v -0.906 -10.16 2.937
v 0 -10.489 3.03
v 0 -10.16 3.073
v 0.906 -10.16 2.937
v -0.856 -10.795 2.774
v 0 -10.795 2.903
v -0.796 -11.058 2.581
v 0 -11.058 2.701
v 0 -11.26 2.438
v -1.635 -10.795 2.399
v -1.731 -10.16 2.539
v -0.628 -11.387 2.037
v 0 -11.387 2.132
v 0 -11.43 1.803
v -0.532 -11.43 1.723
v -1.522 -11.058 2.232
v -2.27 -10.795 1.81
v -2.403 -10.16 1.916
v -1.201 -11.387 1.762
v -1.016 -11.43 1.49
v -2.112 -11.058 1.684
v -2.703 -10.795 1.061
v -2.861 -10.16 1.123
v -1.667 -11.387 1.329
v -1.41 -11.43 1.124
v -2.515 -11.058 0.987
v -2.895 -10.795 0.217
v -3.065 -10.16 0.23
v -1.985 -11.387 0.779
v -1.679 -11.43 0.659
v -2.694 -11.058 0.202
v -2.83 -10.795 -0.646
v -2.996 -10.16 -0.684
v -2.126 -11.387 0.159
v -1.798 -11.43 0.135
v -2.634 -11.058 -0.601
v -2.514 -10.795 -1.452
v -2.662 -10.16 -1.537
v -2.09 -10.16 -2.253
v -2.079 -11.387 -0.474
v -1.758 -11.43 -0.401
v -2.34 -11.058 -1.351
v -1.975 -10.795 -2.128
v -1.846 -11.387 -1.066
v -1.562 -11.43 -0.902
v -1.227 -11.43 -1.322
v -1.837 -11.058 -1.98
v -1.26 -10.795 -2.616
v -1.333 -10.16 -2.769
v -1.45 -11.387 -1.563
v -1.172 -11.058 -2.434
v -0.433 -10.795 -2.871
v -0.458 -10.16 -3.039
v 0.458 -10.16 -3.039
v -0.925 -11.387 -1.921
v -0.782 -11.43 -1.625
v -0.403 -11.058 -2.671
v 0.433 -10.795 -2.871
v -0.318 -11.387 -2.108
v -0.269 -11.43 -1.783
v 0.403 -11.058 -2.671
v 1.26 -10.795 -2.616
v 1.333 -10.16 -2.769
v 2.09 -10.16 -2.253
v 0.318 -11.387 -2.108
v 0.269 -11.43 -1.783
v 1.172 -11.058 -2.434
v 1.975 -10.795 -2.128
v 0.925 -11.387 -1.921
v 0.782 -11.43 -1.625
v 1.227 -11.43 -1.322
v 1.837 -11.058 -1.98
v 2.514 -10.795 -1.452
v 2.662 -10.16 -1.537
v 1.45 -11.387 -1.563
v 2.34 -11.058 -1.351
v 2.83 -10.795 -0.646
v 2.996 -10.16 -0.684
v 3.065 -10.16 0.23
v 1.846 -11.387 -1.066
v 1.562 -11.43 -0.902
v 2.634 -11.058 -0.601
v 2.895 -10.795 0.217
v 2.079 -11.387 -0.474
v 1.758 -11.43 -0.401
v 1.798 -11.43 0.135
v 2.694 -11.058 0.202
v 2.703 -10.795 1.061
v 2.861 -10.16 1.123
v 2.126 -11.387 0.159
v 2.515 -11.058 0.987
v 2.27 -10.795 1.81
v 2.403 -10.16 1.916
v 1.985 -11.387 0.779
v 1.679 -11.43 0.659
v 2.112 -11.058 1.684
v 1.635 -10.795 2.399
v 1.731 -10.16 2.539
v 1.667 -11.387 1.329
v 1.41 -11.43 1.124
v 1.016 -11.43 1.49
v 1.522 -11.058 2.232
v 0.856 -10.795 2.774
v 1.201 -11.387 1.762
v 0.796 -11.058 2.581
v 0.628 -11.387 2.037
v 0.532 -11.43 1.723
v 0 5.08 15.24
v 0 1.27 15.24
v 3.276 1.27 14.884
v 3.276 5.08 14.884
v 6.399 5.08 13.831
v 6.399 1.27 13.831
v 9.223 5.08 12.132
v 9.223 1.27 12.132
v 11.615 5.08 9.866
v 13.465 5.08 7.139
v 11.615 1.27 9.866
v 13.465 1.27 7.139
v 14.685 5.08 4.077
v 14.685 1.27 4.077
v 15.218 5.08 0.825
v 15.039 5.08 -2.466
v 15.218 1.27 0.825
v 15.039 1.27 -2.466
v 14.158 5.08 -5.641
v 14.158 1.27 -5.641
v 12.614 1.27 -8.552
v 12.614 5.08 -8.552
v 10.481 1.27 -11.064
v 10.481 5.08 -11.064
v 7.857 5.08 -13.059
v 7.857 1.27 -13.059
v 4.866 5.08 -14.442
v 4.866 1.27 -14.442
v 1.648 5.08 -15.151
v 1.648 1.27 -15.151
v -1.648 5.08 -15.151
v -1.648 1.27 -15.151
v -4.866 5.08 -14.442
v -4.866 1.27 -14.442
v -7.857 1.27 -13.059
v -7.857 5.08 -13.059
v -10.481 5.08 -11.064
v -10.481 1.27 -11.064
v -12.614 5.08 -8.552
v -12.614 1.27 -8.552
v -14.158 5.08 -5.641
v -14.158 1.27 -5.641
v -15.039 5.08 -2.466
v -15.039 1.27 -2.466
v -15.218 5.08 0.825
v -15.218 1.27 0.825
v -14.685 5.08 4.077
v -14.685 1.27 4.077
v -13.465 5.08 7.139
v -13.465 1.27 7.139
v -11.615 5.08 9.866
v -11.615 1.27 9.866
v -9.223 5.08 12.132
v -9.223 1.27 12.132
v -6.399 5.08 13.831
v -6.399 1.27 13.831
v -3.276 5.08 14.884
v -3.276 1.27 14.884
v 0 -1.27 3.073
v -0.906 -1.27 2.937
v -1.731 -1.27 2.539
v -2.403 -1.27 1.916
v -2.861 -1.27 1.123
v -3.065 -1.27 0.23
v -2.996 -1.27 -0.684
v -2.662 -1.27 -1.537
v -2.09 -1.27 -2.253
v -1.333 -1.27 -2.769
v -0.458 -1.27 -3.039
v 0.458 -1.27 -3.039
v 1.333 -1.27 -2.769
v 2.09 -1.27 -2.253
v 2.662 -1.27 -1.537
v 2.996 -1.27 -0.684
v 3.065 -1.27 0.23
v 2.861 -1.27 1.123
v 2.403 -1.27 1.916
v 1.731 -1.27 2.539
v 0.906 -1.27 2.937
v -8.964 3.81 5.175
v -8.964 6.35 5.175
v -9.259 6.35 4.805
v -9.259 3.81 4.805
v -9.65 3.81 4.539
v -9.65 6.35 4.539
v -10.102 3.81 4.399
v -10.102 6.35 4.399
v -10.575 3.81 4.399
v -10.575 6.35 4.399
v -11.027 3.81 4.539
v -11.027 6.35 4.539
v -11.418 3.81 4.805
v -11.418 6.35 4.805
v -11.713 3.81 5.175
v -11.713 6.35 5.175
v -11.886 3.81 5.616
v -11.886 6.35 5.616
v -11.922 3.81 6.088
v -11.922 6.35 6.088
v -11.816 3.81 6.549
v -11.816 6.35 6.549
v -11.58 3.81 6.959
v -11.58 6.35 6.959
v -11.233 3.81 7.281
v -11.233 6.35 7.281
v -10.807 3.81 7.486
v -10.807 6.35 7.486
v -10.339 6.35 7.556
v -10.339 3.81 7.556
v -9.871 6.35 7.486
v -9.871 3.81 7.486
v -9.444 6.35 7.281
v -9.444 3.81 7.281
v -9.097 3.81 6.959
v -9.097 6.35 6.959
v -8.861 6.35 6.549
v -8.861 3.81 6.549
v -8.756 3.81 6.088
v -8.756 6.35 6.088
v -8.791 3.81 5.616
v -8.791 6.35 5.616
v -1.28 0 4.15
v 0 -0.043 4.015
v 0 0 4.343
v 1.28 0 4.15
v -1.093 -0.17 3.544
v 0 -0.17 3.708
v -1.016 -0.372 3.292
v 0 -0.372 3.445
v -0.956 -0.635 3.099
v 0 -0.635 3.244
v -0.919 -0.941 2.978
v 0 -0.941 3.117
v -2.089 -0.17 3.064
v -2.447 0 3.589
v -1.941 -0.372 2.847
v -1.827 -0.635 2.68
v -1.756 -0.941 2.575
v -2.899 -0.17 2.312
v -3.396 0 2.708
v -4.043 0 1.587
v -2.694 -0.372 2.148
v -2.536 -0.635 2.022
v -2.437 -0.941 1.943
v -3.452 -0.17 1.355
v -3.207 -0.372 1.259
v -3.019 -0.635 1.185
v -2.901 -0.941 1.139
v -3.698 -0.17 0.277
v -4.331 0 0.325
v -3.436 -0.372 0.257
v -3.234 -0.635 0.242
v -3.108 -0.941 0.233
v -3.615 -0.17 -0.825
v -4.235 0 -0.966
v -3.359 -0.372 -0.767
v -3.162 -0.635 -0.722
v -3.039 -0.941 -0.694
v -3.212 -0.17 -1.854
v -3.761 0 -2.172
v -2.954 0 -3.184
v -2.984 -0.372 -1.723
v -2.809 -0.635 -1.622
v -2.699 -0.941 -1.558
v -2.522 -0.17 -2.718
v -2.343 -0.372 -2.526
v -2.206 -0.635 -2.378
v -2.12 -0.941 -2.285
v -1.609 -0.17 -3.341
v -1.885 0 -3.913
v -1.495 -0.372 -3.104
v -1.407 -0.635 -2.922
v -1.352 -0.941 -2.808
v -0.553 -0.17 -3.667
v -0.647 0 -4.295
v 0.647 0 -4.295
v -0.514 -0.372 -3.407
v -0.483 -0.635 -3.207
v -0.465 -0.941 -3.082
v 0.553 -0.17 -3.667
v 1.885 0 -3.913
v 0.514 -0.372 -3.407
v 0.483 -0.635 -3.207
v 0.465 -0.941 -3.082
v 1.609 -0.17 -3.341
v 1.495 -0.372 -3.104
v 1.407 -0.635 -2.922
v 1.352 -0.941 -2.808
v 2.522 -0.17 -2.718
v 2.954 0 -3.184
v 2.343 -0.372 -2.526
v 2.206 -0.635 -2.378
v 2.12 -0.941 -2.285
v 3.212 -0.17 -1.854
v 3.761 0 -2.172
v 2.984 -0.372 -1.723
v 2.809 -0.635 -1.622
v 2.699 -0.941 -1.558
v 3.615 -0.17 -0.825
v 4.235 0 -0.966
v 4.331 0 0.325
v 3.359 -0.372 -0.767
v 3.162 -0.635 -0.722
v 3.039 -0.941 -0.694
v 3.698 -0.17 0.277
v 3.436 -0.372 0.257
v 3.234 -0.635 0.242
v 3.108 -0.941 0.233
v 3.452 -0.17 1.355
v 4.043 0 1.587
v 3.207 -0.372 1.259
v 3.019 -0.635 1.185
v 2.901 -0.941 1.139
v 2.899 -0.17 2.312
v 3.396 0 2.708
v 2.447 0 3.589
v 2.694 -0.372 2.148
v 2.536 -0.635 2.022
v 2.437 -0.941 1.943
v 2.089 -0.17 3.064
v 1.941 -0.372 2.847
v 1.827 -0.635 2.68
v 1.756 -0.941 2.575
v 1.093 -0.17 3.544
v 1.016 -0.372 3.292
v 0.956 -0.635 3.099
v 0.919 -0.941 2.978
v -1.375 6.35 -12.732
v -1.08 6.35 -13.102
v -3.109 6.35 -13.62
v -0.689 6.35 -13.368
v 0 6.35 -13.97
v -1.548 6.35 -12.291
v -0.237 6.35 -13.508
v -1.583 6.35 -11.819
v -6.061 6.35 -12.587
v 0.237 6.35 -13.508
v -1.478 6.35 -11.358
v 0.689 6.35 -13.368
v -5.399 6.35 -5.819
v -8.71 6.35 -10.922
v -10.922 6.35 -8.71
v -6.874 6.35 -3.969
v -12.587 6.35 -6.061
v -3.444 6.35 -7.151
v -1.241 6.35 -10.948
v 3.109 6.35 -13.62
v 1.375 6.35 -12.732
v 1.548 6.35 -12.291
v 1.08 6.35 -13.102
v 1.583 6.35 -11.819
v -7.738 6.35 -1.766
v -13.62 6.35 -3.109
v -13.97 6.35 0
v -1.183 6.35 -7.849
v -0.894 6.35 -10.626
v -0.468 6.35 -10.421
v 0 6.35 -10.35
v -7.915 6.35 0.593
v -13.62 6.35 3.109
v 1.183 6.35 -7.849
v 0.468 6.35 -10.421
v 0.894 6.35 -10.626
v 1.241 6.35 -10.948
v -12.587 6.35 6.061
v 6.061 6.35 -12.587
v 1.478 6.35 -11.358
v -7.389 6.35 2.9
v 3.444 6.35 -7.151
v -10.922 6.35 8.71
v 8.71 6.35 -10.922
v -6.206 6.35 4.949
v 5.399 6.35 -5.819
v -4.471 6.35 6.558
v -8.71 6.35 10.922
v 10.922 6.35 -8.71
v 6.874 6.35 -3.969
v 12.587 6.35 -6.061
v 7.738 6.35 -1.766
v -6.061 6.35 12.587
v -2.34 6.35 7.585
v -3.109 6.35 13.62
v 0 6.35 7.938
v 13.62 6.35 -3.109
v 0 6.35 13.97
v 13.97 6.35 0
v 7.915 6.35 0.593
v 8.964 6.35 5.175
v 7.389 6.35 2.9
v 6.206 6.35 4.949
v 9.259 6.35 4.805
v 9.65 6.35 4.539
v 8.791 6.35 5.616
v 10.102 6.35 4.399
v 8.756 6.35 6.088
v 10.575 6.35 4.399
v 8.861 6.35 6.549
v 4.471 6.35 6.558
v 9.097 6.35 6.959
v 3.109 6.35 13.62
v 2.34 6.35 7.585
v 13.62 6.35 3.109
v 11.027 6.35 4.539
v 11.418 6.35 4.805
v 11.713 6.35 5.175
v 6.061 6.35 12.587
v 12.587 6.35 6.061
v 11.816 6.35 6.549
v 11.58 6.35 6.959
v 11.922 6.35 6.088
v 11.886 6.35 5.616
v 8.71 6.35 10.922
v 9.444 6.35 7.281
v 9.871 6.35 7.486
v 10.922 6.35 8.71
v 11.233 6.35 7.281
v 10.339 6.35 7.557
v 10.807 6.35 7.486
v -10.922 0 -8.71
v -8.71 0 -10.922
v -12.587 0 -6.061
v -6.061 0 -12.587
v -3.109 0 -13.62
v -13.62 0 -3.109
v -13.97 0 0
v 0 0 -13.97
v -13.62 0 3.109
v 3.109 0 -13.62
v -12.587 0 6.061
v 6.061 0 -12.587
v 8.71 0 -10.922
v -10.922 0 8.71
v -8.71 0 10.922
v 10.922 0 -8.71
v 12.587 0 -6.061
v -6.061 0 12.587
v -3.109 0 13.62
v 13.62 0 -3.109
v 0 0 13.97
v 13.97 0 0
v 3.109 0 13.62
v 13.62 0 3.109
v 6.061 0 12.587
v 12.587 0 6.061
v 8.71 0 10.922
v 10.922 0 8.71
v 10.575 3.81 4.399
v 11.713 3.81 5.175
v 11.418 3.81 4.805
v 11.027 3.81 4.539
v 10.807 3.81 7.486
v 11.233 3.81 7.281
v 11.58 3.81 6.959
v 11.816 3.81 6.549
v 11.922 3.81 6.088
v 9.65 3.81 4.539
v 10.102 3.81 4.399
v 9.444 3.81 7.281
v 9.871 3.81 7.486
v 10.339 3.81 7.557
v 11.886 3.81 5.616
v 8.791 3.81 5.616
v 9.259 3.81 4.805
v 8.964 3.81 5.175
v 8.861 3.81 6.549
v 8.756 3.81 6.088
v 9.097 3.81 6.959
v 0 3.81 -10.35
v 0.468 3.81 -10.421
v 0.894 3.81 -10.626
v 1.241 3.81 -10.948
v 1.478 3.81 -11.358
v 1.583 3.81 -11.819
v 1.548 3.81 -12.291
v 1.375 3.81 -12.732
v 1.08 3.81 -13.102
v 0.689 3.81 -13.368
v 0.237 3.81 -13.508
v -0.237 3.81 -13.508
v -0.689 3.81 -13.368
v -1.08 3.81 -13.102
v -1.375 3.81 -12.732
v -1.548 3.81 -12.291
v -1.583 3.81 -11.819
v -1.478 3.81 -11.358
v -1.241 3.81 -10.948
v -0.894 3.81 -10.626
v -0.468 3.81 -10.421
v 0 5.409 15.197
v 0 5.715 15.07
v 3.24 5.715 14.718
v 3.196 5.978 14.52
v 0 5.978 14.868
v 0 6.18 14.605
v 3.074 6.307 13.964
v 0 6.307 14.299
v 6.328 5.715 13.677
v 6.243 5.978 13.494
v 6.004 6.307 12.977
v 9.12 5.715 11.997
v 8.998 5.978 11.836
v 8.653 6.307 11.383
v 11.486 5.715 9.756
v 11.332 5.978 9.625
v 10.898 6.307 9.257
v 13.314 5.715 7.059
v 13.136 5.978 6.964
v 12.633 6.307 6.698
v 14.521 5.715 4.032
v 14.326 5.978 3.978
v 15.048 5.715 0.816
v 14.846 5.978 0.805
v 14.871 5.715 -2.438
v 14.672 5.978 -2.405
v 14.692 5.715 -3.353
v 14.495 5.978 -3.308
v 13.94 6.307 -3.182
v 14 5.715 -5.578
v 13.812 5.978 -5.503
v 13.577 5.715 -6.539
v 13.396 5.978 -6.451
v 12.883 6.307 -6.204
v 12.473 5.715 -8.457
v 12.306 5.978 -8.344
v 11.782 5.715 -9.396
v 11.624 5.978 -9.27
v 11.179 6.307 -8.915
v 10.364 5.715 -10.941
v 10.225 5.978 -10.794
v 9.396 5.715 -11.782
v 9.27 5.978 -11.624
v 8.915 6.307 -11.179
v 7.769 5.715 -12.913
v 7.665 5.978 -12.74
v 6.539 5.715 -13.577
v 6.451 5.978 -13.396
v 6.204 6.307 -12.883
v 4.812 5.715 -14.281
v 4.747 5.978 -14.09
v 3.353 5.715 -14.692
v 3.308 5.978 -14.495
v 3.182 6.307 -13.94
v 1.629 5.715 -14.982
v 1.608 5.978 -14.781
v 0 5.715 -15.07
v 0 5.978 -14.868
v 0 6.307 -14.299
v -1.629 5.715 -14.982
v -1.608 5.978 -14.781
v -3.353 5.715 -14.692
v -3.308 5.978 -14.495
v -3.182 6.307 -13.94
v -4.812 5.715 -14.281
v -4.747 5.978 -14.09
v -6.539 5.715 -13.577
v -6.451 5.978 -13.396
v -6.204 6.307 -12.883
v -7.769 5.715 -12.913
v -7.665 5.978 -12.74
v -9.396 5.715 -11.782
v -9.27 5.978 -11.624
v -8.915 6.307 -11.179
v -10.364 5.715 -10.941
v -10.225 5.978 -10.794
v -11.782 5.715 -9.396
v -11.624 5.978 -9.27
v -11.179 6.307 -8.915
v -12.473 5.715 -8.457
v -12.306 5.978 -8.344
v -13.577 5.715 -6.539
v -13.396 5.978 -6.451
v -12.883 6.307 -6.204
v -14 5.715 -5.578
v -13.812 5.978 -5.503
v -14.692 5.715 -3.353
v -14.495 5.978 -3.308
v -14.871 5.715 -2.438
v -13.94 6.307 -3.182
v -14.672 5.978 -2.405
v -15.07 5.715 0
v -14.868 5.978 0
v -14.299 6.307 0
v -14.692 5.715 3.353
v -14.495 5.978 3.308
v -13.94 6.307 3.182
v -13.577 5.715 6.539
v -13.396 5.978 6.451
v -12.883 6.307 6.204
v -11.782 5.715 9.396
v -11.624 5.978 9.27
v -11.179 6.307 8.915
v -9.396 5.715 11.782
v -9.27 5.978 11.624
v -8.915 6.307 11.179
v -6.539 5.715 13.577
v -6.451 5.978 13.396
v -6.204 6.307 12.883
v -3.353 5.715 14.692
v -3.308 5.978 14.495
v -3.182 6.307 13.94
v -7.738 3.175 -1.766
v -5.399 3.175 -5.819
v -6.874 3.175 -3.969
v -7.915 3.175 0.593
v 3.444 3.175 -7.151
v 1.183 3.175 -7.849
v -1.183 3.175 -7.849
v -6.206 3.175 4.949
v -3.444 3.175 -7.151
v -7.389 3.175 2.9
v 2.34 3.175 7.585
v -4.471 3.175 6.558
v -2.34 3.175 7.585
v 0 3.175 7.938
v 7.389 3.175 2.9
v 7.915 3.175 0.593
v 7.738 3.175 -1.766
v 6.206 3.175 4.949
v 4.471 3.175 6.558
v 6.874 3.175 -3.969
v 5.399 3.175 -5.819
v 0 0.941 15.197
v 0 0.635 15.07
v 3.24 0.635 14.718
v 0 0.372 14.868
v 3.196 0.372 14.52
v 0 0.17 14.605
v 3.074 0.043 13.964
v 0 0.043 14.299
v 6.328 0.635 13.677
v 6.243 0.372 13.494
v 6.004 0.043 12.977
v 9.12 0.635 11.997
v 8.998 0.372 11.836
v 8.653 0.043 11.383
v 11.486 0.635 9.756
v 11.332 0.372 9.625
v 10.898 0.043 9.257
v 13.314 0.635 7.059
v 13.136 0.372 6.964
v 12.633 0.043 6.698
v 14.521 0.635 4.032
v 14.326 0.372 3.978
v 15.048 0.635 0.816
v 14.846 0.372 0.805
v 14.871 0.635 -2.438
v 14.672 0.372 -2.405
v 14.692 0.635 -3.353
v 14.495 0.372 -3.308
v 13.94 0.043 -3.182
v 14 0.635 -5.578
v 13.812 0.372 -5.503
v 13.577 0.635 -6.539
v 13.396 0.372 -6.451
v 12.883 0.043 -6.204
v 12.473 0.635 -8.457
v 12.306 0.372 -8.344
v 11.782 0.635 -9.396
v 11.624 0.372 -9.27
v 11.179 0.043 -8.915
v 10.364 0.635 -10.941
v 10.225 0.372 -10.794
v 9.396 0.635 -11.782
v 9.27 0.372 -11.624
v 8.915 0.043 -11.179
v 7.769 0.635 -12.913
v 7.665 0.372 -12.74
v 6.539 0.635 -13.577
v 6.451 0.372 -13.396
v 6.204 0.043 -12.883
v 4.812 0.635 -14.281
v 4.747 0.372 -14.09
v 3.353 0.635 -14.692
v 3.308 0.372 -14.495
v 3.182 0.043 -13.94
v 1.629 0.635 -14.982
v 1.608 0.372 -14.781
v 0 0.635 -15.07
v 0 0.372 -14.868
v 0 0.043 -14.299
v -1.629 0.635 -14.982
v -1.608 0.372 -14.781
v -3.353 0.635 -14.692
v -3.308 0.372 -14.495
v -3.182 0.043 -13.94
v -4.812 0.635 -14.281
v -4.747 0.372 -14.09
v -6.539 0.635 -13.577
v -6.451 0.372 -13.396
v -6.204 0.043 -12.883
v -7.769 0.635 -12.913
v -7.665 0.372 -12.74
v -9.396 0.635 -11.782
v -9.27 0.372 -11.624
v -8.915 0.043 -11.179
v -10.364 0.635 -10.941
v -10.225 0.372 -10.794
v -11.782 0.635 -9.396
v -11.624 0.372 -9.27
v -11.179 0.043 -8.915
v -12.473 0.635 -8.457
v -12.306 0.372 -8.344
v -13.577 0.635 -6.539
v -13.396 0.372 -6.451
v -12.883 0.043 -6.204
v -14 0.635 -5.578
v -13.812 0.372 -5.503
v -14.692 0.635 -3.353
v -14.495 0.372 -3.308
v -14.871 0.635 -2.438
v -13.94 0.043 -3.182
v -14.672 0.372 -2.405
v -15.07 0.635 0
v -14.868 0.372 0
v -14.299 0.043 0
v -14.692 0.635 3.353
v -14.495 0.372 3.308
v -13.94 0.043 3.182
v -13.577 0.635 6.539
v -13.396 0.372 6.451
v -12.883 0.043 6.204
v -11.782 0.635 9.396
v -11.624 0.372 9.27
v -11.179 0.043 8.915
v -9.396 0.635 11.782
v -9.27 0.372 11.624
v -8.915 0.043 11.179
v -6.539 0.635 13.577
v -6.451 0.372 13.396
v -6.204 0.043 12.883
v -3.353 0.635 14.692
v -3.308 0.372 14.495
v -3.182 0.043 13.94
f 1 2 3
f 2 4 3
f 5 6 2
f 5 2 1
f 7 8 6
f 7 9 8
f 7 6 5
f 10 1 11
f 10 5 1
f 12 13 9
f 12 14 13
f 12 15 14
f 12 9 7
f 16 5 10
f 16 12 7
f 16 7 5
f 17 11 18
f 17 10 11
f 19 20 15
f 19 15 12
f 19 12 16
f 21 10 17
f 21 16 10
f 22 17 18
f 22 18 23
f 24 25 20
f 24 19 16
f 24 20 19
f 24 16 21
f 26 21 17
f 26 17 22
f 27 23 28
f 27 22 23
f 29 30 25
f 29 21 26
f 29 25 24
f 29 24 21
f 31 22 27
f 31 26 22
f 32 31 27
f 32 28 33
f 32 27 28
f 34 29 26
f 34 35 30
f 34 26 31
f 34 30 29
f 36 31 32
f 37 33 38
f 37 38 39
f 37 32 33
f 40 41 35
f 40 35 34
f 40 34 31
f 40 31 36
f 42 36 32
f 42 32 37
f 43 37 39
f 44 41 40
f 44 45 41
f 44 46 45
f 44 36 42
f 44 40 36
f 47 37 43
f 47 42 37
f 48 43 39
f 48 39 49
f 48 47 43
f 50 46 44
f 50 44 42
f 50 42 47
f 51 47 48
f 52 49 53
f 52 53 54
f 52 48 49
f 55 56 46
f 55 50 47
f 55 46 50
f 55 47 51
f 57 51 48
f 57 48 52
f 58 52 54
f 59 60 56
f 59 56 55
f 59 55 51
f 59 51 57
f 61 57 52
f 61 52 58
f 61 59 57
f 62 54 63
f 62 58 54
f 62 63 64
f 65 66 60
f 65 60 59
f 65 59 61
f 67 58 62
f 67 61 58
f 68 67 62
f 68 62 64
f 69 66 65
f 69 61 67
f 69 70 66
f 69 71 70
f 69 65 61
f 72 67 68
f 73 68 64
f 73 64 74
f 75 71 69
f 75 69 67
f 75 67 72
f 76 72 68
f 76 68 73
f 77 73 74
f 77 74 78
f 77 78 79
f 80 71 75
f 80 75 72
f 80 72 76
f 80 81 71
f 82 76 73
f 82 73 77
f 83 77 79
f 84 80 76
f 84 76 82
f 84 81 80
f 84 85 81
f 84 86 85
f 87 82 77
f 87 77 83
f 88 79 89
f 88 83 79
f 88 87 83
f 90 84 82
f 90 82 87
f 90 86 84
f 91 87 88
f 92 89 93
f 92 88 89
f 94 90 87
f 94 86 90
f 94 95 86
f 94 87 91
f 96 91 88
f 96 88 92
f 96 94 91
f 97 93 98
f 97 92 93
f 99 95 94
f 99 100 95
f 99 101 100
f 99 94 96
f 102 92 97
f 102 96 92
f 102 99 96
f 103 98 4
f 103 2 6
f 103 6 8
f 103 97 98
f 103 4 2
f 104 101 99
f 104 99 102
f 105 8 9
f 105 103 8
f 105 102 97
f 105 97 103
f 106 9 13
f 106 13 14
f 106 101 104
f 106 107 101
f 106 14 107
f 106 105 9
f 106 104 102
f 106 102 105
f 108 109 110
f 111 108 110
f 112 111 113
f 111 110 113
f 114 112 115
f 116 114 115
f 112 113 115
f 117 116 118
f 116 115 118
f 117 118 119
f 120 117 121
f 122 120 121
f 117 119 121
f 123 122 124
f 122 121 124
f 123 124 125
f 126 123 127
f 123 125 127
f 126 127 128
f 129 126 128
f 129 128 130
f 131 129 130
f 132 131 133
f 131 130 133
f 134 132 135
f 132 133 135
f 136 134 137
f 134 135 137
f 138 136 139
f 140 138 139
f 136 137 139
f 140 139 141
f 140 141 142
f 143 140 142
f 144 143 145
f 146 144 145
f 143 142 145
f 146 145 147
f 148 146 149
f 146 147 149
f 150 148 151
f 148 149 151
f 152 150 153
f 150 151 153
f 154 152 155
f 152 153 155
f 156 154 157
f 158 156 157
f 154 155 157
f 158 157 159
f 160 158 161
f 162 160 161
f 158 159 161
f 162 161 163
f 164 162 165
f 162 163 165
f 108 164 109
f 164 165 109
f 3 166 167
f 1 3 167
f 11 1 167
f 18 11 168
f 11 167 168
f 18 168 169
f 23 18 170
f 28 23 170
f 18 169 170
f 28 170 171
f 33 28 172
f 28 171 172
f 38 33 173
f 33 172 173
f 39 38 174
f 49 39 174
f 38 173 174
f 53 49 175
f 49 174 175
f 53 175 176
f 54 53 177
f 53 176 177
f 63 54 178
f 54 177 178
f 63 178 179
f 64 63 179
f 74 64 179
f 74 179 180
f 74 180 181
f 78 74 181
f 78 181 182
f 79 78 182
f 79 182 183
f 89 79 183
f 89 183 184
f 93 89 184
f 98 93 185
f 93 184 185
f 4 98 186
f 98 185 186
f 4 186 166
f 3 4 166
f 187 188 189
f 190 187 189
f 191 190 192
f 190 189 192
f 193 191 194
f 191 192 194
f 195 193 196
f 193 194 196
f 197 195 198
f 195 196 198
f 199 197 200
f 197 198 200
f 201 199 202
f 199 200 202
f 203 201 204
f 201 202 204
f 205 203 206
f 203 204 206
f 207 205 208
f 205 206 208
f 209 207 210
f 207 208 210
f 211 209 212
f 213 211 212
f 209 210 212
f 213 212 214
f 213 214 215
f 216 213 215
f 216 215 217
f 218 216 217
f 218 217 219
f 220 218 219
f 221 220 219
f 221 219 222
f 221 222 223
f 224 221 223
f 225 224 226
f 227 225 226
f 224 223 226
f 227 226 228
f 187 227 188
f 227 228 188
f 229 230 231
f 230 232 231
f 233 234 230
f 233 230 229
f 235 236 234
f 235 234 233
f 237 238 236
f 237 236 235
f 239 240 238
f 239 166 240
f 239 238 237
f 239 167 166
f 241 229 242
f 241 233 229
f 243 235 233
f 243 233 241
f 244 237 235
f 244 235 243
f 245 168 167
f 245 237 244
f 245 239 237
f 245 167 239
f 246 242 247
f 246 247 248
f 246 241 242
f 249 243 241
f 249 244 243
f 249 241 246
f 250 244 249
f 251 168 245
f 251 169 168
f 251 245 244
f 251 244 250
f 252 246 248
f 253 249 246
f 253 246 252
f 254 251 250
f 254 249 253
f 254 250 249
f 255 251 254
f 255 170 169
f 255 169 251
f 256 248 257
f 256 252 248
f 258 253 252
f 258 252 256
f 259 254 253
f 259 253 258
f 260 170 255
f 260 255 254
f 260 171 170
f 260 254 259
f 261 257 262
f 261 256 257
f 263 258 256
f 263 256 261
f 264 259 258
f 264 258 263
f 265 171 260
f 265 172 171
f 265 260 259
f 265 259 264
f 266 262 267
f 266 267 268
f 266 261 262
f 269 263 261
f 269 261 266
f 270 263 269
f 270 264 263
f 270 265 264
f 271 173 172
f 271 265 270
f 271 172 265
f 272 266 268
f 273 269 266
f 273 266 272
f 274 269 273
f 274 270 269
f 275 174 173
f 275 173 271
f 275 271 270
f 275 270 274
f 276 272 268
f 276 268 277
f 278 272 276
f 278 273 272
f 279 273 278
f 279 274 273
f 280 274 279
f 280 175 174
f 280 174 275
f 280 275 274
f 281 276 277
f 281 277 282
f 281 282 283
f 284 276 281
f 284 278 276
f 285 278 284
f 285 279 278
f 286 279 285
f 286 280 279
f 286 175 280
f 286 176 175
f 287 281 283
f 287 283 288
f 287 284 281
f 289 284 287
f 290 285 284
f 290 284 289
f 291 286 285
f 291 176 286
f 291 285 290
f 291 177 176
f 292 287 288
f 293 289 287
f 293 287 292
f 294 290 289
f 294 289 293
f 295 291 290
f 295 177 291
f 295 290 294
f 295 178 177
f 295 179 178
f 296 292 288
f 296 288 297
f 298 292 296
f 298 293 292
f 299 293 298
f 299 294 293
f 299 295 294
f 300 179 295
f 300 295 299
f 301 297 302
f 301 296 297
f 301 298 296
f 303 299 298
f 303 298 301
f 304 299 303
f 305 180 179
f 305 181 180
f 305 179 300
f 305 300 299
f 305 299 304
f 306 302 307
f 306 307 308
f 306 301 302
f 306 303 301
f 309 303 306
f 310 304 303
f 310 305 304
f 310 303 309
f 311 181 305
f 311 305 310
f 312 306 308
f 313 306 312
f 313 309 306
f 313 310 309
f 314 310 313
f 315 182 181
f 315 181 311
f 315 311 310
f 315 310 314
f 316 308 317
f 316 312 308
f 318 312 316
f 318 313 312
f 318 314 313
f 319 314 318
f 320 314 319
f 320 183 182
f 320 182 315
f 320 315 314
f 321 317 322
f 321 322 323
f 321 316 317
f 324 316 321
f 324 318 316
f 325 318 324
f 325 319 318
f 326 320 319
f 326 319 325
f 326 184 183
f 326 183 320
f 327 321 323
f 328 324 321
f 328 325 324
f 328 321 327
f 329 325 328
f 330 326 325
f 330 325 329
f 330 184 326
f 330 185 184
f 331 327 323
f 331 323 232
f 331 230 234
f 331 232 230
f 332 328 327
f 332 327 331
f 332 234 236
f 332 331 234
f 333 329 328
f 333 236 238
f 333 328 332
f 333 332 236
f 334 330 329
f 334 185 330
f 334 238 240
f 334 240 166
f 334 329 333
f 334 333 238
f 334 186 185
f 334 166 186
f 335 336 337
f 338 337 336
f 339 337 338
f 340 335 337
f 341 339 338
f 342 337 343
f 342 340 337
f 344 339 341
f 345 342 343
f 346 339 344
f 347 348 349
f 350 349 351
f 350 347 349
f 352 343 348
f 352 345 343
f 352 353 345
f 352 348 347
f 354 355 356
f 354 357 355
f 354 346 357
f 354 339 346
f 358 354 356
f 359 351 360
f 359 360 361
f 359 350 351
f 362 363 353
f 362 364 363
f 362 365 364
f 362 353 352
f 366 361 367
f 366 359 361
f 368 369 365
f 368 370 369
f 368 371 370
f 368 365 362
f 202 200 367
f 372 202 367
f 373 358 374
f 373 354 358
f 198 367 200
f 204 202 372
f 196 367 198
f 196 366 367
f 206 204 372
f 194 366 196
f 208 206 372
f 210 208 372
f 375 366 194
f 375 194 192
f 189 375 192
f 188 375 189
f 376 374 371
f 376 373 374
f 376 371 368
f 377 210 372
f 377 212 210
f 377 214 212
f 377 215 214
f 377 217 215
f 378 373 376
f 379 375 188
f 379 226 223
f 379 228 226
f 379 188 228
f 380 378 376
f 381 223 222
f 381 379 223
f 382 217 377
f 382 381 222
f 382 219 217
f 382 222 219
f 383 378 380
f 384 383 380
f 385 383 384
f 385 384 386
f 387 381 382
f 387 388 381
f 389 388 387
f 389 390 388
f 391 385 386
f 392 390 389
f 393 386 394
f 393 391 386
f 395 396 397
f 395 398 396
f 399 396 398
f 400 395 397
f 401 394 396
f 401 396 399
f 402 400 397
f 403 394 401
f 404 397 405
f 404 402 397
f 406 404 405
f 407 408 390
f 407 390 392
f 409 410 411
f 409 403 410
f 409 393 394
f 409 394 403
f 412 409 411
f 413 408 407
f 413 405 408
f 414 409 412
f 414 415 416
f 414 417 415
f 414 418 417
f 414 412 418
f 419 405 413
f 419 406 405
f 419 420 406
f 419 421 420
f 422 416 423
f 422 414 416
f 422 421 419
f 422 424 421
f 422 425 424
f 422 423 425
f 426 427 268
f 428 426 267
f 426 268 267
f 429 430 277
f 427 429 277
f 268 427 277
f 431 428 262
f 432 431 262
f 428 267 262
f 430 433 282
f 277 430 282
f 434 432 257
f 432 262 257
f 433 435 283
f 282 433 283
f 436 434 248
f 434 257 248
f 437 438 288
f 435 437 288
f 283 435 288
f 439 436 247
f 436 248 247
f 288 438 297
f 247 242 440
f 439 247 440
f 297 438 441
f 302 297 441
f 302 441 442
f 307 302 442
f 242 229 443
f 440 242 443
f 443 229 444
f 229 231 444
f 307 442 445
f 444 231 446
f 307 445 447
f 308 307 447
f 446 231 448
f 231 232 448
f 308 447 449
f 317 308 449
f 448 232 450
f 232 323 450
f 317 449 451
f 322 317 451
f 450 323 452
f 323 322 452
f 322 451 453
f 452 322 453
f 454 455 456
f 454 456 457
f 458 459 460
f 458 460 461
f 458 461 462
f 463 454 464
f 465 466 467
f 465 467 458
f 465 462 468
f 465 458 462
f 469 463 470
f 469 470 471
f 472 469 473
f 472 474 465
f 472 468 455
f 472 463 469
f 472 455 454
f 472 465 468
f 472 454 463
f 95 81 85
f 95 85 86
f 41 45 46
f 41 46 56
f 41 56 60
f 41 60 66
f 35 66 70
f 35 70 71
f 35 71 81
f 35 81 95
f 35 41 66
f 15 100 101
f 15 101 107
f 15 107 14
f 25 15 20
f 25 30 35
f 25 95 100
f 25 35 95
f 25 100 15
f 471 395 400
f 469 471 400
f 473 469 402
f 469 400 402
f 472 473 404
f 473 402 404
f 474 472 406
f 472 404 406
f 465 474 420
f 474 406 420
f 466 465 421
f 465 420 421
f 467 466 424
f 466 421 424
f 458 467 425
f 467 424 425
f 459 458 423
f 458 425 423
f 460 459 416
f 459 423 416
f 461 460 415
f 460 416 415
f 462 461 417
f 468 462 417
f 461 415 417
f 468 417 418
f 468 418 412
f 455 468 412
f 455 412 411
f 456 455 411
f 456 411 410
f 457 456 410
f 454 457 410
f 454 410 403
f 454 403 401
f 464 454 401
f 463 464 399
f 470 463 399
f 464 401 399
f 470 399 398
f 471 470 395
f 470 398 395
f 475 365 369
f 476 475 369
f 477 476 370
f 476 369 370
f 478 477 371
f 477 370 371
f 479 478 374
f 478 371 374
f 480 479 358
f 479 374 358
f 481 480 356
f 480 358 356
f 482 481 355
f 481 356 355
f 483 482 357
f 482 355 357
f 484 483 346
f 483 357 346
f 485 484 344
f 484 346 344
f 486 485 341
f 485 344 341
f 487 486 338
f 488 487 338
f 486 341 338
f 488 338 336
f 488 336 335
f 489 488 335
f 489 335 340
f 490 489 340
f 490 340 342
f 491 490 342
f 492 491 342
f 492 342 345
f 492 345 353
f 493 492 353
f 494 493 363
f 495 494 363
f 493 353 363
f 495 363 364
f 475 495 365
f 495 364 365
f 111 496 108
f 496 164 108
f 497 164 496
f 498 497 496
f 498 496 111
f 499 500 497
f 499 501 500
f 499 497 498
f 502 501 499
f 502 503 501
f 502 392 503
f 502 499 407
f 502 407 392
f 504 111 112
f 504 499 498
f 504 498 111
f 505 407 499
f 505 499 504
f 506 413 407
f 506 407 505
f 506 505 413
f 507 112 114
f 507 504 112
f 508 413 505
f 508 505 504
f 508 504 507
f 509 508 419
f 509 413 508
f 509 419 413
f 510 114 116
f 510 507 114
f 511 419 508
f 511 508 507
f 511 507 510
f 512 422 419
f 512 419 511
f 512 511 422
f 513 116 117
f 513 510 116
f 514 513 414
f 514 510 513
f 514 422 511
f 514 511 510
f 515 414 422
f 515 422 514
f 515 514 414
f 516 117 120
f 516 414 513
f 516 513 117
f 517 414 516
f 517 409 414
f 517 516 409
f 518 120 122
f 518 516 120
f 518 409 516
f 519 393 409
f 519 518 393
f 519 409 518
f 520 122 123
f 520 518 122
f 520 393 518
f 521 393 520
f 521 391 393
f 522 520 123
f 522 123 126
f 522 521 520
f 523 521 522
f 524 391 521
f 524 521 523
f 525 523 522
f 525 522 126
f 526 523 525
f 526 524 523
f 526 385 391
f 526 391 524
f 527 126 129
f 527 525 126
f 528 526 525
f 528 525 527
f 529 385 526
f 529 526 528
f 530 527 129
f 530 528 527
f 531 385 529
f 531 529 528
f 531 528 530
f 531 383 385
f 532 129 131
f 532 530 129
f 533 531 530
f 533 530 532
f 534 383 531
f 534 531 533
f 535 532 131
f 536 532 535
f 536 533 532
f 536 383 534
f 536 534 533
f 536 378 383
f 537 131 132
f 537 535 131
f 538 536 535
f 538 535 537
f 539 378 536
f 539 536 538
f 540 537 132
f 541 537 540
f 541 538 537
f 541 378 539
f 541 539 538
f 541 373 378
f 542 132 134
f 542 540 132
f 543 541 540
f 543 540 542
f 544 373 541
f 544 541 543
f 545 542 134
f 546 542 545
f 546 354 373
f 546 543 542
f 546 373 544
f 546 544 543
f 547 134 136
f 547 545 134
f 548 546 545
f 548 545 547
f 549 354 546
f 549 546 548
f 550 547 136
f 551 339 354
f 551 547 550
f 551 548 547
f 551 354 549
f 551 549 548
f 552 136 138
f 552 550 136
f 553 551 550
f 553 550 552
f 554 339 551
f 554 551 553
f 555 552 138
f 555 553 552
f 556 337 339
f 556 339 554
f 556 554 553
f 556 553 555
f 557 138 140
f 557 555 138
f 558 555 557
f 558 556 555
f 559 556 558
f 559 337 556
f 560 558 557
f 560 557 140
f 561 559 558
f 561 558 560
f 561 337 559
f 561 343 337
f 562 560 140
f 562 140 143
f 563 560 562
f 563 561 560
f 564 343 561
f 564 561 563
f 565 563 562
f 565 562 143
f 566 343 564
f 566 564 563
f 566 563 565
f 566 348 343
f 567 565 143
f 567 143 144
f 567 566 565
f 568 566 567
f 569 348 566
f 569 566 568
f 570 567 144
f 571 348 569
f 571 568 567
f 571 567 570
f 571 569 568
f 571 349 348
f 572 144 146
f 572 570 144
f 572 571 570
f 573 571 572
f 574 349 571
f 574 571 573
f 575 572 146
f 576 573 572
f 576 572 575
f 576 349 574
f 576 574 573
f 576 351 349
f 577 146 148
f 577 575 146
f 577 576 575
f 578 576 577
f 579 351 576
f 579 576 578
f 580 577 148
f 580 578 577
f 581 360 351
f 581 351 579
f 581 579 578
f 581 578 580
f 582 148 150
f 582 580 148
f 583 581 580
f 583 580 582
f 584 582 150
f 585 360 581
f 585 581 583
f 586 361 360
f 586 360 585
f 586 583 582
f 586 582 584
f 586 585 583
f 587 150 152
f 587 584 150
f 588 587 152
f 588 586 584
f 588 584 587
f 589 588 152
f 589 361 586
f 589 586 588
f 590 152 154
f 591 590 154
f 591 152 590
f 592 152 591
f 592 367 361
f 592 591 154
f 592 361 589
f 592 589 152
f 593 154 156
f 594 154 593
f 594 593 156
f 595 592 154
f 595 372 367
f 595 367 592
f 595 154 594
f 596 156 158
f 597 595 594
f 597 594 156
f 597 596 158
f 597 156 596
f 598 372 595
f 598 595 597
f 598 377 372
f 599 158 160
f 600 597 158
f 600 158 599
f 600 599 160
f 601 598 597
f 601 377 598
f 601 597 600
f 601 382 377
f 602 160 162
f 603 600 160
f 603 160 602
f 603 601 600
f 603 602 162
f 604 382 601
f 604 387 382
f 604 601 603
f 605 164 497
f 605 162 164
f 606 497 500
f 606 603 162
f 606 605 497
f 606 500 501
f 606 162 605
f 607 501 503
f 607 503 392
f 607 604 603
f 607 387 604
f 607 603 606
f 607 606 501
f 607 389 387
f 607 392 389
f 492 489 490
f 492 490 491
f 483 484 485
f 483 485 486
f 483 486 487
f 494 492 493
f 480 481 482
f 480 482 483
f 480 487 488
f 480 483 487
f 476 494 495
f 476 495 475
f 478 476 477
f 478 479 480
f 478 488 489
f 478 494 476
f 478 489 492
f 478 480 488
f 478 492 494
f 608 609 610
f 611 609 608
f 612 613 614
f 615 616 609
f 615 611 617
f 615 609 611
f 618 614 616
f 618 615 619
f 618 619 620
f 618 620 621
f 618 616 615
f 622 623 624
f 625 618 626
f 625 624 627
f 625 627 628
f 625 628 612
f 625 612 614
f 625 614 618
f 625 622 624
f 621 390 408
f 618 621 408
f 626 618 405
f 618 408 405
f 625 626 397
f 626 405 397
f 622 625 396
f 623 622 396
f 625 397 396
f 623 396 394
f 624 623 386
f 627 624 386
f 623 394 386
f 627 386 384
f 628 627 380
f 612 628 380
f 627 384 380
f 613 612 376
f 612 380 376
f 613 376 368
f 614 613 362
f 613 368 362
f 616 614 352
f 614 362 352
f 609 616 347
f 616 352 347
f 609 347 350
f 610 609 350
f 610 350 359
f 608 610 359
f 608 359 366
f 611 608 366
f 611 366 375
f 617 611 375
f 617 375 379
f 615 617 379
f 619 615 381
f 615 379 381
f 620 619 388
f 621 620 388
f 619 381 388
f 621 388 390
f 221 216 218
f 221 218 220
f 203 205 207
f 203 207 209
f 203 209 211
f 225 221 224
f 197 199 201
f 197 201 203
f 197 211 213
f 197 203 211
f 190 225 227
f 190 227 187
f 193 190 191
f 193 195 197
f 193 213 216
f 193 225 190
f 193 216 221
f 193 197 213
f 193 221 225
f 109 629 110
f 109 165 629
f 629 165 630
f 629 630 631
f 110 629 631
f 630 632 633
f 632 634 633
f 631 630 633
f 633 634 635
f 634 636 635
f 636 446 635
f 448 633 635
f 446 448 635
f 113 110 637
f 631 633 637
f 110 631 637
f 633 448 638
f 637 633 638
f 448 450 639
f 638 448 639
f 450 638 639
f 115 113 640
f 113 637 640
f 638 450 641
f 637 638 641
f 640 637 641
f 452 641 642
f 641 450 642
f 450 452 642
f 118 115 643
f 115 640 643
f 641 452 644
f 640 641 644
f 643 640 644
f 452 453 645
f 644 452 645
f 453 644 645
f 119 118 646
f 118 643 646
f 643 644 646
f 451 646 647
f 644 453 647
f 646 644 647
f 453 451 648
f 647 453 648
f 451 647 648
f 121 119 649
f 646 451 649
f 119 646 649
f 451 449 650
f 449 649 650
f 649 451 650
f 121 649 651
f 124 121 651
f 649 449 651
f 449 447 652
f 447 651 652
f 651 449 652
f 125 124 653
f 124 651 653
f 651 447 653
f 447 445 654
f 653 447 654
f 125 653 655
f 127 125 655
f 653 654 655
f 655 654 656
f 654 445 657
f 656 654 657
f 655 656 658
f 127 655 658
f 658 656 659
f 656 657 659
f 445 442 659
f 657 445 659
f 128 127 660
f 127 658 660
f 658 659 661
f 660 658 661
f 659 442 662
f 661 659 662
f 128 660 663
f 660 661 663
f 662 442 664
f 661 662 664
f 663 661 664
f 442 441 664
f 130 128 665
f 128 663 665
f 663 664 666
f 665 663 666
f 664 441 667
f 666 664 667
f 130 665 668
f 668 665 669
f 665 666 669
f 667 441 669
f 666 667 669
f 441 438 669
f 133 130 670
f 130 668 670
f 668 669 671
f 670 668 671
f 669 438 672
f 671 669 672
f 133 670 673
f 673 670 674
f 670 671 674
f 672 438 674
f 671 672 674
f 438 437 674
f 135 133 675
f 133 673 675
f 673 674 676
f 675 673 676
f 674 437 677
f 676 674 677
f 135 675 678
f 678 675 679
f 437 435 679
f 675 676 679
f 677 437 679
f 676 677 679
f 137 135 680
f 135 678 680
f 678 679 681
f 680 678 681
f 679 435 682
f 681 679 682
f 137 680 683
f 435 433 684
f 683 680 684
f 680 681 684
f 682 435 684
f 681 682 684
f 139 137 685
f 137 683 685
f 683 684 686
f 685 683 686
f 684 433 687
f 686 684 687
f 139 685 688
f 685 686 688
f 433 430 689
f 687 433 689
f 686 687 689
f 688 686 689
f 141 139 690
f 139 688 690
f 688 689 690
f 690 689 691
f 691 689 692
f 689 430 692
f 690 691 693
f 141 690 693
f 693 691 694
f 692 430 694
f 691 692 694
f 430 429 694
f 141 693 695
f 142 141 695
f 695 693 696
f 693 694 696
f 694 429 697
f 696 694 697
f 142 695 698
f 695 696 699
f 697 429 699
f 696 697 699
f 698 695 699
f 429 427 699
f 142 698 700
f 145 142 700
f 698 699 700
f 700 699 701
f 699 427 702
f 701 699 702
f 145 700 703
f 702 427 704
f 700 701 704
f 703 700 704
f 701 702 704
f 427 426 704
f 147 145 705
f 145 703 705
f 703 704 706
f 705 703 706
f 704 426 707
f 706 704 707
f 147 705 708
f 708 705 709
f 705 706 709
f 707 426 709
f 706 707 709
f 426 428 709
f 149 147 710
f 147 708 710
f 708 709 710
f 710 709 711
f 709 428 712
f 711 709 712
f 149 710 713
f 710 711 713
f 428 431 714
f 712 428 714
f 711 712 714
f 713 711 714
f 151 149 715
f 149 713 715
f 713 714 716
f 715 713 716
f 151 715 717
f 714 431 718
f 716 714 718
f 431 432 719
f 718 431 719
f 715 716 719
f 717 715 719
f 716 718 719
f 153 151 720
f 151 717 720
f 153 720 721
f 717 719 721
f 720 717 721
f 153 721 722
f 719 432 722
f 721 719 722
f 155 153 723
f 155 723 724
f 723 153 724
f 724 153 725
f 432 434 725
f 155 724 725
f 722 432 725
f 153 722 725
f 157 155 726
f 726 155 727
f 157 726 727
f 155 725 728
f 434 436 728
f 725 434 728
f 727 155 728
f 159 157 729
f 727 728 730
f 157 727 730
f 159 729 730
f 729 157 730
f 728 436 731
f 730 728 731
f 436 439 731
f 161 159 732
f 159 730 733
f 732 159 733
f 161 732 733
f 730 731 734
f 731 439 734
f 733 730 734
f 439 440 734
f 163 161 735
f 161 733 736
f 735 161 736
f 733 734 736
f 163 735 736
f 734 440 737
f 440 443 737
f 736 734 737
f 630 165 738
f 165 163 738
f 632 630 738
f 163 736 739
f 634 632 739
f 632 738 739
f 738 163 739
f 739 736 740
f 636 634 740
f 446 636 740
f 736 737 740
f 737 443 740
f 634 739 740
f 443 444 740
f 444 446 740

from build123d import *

# Parameters (mm, degrees)
SKETCH1_R           = 15.24
BOSS_EXTRUDE1_DEPTH = 6.35
SKETCH2_R           = 7.9375
CUT_EXTRUDE1_DEPTH  = 3.175
FILLET4_R           = 1.27
SKETCH4_R           = 1.5875
CUT_EXTRUDE2_DEPTH  = 2.54
CIRPATTERN1_COUNT   = 3
FILLET6_R           = 1.27
SKETCH3_R           = 3.0734
BOSS_EXTRUDE4_DEPTH = 11.43
FILLET7_R           = 1.27


with BuildPart() as part:
    # Sketch1 → Boss-Extrude1 (new body)
    with BuildSketch(Plane(origin=(0, 0, 0), x_dir=(1, 0, 0), z_dir=(0, 1, 0))):
        Circle(SKETCH1_R)
    extrude(amount=BOSS_EXTRUDE1_DEPTH)

    # Sketch2 → Cut-Extrude1 (cut)
    with BuildSketch(Plane(origin=(0, 6.35, 0), x_dir=(1, 0, 0), z_dir=(0, 1, 0))):
        Circle(SKETCH2_R)
    extrude(amount=-CUT_EXTRUDE1_DEPTH, mode=Mode.SUBTRACT)

    # Fillet4
    fillet4_edges = [part.edges().sort_by_distance(p)[0] for p in [
        (-15.24, 6.35, 0),
    ]]
    fillet(fillet4_edges, radius=FILLET4_R)

    # Sketch4 → Cut-Extrude2 (cut)
    with BuildSketch(Plane(origin=(0, 6.35, 0), x_dir=(1, 0, 0), z_dir=(0, 1, 0))):
        with Locations((0, 11.938)):
            Circle(SKETCH4_R)
    cut_extrude2 = extrude(amount=-CUT_EXTRUDE2_DEPTH, mode=Mode.SUBTRACT)

    # CirPattern1: Cut-Extrude2 ×3 about axis
    cirpattern1_axis = Axis((0, 3.175, 0), (0, 1, 0))
    for i in range(1, CIRPATTERN1_COUNT):
        add(cut_extrude2.rotate(cirpattern1_axis, i * 360 / CIRPATTERN1_COUNT), mode=Mode.SUBTRACT)

    # Fillet6
    fillet6_edges = [part.edges().sort_by_distance(p)[0] for p in [
        (-15.24, 0, 0),
    ]]
    fillet(fillet6_edges, radius=FILLET6_R)

    # Sketch3 → Boss-Extrude4 (add)
    with BuildSketch(Plane.XZ):
        Circle(SKETCH3_R)
    extrude(amount=BOSS_EXTRUDE4_DEPTH)

    # Fillet7
    fillet7_edges = [part.edges().sort_by_distance(p)[0] for p in [
        (-3.0734, -11.43, 0),
        (-3.0734, 0, 0),
    ]]
    fillet(fillet7_edges, radius=FILLET7_R)


solid = part.part
